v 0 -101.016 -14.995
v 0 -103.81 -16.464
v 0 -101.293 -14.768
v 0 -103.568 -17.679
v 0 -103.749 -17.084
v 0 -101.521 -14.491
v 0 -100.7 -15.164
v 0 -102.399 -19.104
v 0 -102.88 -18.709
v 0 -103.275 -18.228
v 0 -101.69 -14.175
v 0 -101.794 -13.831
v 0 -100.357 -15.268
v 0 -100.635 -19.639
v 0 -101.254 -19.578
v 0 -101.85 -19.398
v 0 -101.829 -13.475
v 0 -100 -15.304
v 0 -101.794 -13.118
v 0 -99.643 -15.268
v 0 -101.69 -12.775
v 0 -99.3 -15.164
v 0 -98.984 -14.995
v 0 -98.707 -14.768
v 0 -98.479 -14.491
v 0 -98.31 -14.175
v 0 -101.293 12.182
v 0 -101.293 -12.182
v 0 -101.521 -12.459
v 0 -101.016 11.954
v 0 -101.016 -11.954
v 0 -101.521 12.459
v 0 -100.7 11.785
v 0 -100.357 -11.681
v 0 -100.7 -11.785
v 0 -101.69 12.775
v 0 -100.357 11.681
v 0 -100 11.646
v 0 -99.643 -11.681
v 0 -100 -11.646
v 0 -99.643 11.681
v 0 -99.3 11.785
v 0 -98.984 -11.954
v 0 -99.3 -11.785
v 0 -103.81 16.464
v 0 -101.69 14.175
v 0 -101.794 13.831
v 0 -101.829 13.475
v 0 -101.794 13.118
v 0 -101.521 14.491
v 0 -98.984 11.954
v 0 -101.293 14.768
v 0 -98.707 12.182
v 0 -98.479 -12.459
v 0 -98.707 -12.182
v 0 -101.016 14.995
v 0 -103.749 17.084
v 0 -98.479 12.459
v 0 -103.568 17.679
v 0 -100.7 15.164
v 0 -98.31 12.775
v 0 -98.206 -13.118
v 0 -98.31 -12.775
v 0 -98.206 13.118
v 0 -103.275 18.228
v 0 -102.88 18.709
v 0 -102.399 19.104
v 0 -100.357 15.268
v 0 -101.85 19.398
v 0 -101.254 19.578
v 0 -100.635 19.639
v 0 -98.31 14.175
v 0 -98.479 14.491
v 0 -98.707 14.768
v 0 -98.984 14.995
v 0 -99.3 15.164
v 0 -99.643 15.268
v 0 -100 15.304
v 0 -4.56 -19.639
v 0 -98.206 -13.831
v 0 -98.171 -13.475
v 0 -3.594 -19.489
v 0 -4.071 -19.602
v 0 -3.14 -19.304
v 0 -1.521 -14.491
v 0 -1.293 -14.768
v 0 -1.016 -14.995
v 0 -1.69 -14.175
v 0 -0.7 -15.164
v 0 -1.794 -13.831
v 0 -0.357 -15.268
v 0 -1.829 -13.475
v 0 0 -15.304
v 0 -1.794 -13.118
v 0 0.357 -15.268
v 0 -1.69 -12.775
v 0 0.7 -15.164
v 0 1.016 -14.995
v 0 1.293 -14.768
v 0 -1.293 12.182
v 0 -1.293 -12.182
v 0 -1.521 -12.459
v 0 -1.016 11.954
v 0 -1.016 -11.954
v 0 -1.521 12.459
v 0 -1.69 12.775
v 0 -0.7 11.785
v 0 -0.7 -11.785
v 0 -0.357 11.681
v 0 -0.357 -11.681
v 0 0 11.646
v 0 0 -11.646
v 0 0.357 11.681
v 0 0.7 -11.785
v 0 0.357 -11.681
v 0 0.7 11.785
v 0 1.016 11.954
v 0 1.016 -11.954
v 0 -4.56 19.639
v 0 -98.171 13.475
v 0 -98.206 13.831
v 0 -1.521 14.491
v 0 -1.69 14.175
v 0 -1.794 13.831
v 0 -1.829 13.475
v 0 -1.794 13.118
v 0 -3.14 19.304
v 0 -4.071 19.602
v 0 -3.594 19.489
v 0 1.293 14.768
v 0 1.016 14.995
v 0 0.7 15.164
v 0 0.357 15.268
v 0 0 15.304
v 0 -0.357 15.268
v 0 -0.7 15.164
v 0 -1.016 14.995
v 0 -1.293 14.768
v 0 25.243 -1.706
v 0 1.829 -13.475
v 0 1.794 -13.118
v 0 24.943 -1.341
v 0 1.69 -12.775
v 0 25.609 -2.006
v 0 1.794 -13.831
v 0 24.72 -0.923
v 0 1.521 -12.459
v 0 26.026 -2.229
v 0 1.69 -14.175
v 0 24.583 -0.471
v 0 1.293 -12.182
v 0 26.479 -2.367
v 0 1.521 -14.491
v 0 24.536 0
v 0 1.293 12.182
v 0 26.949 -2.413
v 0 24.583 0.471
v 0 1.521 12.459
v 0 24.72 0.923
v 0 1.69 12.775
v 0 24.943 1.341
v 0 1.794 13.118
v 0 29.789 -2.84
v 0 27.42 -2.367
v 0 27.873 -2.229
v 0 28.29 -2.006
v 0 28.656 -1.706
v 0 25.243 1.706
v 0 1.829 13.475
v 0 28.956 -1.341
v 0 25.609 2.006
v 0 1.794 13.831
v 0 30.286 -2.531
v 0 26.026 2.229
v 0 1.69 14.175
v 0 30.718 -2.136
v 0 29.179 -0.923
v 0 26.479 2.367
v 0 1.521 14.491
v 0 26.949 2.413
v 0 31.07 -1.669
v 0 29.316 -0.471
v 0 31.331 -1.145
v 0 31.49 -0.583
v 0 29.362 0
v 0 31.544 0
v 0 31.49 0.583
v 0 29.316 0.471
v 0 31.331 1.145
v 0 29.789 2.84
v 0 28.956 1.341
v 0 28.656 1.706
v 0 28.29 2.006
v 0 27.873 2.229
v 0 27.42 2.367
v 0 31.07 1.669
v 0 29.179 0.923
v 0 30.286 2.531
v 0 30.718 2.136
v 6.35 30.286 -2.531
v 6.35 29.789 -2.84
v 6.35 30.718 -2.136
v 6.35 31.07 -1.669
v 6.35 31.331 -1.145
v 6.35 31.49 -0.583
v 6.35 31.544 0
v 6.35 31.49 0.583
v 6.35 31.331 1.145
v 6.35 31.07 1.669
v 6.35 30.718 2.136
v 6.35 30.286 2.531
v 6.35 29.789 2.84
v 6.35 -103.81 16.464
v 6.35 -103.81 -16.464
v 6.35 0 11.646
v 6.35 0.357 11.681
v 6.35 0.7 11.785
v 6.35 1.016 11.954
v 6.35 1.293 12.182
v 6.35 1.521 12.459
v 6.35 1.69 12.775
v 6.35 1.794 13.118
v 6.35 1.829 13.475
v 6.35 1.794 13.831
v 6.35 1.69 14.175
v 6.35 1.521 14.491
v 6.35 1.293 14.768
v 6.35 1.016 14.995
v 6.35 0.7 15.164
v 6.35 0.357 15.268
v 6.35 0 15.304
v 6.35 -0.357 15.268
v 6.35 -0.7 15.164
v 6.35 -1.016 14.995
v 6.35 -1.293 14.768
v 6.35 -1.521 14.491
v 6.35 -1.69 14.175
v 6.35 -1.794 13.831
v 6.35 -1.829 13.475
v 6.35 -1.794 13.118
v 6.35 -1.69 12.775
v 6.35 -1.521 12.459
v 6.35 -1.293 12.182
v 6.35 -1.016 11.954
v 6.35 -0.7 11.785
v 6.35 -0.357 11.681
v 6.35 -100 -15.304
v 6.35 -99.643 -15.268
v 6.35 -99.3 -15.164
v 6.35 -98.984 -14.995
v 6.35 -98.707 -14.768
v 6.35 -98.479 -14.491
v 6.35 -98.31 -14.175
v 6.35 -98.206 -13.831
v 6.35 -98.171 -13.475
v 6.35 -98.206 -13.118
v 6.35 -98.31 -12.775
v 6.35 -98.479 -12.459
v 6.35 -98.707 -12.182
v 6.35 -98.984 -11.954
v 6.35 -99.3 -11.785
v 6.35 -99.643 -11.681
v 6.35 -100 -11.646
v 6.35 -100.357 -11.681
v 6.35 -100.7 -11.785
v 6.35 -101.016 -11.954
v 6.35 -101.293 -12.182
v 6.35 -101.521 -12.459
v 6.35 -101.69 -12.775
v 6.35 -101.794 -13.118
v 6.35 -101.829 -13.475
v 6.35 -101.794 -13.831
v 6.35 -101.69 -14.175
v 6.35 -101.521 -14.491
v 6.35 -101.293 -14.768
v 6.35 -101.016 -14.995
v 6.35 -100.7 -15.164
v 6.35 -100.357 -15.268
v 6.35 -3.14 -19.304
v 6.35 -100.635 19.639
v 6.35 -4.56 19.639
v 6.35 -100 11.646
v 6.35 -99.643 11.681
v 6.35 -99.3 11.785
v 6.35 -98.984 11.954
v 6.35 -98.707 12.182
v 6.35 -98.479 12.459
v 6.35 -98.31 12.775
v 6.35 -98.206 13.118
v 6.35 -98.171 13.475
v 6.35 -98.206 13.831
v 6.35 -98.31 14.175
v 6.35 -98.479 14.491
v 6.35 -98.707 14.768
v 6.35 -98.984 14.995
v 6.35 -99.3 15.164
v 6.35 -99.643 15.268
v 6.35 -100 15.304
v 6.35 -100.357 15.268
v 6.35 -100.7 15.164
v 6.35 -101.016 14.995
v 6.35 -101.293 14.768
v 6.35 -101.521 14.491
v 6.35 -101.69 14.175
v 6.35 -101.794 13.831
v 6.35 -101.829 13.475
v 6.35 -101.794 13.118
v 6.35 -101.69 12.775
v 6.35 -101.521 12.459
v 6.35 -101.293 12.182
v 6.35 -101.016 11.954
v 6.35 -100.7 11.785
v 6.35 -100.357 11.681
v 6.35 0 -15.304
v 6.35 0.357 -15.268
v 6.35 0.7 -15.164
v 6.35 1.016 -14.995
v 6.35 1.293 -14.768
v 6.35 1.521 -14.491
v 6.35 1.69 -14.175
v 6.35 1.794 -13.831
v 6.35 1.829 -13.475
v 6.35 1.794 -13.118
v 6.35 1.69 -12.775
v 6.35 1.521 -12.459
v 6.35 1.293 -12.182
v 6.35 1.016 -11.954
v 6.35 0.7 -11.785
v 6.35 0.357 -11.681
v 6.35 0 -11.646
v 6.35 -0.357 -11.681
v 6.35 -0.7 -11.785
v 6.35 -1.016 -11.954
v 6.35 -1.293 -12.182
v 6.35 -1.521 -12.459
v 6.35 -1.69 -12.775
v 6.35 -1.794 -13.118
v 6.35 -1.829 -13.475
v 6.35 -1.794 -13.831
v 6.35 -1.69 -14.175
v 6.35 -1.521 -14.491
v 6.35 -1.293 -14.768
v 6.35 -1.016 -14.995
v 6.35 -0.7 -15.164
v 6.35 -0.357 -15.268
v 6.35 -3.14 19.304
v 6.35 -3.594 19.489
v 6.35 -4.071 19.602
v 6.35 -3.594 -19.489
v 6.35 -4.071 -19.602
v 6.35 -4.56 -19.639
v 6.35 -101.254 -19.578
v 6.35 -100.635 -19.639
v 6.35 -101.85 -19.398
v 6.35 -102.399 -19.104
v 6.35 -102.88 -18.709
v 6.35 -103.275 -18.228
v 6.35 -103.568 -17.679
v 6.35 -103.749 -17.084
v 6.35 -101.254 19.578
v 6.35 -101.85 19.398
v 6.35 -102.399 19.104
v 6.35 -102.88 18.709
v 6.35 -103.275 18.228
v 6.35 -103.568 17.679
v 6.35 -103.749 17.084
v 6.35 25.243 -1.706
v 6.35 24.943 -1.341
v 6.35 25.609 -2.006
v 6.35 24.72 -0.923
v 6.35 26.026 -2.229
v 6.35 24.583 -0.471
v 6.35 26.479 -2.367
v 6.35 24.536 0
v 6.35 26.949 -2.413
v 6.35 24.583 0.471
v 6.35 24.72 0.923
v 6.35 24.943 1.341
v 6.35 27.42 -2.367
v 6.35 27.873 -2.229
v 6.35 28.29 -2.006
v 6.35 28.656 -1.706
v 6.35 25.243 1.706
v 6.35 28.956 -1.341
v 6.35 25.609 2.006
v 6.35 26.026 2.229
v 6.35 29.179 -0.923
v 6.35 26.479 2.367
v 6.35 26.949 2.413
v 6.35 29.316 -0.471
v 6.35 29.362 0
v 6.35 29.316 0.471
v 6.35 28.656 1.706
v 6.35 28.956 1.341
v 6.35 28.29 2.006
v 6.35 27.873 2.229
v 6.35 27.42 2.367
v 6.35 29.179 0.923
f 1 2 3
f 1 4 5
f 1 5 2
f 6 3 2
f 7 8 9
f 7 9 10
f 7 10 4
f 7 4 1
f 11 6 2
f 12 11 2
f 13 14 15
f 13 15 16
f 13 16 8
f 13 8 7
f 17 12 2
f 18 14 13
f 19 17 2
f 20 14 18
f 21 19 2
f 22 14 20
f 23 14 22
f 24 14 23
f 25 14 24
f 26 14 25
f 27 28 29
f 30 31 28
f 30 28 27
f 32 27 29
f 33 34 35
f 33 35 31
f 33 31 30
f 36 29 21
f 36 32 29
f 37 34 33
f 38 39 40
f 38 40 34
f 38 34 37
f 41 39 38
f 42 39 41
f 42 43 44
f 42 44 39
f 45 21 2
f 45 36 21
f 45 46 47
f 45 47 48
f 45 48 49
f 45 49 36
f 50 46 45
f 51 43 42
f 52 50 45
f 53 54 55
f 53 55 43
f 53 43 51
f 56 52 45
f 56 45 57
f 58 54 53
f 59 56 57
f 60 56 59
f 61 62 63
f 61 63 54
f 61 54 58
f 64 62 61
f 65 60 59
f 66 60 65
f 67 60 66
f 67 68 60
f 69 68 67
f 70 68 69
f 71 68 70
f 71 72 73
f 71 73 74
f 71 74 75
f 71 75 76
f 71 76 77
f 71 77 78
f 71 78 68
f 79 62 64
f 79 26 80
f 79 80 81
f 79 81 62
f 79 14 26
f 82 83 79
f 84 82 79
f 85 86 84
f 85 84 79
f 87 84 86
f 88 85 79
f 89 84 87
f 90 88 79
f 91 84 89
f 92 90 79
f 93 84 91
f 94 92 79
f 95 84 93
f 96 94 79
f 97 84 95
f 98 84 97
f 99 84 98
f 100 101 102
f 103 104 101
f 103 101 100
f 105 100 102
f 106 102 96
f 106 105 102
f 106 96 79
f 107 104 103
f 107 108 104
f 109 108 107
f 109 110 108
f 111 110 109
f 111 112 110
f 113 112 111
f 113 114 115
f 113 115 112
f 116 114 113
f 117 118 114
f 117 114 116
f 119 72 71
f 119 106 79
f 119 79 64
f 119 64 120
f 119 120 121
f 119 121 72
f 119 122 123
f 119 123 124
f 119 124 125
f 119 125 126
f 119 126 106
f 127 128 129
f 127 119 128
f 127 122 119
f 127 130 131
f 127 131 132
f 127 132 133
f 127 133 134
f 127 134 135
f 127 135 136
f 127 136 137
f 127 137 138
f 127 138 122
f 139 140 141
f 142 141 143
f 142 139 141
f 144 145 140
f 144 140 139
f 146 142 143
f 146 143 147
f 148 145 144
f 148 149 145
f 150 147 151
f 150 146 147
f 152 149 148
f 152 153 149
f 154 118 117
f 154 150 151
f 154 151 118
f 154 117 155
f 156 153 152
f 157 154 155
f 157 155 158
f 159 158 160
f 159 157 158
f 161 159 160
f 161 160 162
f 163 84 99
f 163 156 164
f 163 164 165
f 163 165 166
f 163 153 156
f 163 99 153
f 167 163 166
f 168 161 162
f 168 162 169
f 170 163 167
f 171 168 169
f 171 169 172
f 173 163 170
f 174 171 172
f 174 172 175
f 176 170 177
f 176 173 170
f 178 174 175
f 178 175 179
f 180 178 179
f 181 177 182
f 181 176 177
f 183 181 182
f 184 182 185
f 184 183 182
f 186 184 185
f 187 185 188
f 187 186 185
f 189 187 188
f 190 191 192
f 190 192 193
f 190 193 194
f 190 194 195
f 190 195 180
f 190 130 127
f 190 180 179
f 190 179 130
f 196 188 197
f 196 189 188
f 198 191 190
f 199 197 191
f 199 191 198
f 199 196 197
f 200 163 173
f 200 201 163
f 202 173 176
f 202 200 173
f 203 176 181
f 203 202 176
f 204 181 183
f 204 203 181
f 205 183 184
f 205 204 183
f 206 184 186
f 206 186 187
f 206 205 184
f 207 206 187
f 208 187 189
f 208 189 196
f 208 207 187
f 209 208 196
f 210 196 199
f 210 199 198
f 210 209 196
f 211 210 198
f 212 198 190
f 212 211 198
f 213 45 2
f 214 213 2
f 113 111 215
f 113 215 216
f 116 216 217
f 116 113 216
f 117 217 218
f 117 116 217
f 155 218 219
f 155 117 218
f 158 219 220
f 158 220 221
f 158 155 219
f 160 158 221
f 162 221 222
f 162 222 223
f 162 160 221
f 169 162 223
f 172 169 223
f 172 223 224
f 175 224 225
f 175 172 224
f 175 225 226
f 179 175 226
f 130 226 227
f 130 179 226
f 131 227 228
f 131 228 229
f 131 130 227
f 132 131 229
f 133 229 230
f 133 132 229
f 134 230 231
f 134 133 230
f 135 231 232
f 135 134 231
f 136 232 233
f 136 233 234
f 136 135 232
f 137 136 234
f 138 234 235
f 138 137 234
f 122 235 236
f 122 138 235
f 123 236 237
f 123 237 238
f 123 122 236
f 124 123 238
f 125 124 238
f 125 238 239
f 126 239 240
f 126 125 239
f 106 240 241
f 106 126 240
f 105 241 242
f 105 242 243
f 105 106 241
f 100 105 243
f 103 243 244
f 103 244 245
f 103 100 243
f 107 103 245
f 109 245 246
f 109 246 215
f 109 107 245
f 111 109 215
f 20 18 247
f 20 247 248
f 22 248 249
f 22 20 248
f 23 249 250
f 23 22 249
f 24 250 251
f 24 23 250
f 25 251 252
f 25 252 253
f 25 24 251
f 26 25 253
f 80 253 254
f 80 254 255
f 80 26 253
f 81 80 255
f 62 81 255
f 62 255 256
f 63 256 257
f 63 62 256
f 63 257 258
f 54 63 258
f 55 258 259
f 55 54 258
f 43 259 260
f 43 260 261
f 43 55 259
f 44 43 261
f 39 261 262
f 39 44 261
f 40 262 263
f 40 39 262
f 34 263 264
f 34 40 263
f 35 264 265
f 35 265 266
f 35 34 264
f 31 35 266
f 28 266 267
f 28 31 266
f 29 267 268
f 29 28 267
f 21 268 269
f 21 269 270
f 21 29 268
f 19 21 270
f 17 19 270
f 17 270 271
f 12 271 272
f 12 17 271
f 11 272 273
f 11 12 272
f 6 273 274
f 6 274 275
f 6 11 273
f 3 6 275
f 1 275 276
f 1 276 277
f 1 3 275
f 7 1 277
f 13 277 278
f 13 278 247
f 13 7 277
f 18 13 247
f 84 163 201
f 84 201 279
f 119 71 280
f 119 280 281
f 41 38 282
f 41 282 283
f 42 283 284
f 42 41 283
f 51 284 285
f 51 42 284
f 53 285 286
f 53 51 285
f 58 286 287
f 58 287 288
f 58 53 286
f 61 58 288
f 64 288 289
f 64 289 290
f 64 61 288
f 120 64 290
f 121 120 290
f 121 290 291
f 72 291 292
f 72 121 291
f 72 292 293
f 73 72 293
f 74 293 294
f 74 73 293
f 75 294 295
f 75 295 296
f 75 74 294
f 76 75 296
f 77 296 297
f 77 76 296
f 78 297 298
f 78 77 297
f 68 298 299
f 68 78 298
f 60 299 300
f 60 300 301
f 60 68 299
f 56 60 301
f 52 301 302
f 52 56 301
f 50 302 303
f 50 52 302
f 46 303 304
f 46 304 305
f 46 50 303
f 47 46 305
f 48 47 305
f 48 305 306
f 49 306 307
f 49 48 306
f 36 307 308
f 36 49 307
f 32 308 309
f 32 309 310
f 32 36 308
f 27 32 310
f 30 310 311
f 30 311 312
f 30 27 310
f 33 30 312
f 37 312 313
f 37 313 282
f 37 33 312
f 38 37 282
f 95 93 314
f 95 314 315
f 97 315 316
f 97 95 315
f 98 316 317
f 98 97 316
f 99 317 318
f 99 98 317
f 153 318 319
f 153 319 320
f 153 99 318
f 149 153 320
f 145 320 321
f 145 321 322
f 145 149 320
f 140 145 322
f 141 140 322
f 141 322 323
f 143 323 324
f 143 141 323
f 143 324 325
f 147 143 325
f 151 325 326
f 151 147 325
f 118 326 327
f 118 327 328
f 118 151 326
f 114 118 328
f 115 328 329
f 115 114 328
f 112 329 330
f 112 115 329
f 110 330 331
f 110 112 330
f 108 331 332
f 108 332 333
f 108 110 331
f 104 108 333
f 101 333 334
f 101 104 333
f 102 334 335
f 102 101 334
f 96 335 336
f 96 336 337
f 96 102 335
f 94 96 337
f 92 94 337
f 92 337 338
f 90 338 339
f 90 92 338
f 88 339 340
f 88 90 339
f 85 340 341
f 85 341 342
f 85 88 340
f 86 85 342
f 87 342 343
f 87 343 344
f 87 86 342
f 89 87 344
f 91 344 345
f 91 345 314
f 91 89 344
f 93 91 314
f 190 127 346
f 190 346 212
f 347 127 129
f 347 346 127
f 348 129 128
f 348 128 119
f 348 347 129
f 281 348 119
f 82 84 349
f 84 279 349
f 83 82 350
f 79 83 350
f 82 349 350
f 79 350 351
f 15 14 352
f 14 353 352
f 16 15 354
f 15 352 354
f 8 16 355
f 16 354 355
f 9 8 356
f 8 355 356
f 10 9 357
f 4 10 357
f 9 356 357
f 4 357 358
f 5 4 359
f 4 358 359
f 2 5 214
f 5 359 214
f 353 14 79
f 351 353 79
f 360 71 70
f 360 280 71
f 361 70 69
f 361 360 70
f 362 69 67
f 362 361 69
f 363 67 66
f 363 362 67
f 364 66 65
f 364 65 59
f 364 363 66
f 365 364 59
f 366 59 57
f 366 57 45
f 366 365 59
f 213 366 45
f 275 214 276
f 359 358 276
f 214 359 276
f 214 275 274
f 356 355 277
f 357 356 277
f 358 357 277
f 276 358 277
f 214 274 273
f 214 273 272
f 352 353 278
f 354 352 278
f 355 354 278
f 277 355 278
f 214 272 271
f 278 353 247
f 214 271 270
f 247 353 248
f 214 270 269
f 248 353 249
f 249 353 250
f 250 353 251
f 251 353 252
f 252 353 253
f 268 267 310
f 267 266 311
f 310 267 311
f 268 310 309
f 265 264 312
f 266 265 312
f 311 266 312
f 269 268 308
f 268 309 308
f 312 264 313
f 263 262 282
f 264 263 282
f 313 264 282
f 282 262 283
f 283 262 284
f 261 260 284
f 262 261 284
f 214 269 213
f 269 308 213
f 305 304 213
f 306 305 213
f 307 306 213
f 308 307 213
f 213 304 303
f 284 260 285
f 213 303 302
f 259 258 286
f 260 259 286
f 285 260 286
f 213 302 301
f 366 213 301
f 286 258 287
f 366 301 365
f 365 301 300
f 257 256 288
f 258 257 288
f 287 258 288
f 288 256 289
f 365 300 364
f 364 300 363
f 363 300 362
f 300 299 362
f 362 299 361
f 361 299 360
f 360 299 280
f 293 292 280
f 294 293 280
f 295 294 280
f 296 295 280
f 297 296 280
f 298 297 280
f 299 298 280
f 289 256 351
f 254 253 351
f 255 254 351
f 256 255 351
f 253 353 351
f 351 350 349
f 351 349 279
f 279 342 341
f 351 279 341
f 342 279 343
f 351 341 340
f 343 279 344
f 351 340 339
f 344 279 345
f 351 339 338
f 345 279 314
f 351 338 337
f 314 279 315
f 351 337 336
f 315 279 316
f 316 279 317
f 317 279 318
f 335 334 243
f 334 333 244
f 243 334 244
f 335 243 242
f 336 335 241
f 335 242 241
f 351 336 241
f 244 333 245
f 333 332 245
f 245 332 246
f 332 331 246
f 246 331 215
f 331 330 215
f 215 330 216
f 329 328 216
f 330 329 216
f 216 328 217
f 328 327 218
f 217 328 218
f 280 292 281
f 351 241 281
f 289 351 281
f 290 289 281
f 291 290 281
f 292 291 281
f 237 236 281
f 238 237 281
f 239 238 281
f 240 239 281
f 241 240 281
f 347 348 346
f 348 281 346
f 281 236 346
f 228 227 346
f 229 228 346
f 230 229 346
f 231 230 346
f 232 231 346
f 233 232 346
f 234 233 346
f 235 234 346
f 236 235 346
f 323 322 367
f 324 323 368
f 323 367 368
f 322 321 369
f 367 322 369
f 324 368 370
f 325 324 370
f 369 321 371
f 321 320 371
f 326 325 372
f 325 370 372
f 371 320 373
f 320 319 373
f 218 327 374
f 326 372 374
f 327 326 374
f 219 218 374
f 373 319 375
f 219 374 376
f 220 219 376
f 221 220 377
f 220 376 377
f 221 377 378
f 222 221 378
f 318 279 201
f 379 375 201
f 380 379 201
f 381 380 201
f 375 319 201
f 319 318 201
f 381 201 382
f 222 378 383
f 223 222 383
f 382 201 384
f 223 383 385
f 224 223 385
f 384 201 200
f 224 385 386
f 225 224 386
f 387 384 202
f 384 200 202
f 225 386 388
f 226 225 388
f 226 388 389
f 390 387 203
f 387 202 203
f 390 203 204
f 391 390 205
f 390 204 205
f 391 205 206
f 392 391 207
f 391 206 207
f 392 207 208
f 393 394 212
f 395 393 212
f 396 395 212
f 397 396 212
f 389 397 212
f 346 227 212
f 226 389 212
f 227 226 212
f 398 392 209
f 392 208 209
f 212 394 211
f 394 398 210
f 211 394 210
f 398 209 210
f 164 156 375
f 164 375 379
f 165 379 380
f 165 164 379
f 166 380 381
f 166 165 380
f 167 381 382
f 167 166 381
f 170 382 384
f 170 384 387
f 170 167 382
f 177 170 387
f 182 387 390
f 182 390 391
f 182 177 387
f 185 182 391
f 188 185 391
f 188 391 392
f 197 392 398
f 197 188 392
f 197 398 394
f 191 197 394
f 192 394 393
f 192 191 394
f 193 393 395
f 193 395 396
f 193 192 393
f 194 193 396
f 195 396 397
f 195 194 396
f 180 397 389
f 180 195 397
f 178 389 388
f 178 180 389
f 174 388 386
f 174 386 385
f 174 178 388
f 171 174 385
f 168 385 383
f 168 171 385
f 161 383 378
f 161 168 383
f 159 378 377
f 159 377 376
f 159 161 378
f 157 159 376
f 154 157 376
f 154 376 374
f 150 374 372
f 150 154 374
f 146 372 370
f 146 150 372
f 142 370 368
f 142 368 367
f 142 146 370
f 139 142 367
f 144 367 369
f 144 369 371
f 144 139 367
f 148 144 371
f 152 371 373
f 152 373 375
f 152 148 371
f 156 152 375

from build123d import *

# Parameters (mm, degrees)
SKETCH1_W           = 39.278818994
SKETCH1_H           = 100
SKETCH1_R           = 1.8288
SKETCH1_R_2         = 2.413
BOSS_EXTRUDE1_DEPTH = 6.35
FILLET1_R           = 3.175


with BuildPart() as part:
    # Sketch1 → Boss-Extrude1 (new body)
    # profile 1 of 2: a face of its own
    with BuildSketch(Plane(origin=(0, 0, 0), x_dir=(0, 0, -1), z_dir=(1, 0, 0))):
        with Locations((0, -53.81)):
            Rectangle(SKETCH1_W, SKETCH1_H)
        with Locations((13.4747, -100)):
            Circle(SKETCH1_R, mode=Mode.SUBTRACT)
        with Locations((-13.4747, -100)):
            Circle(SKETCH1_R, mode=Mode.SUBTRACT)
    # profile 2 of 2: a face of its own
    with BuildSketch(Plane(origin=(0, 0, 0), x_dir=(0, 0, -1), z_dir=(1, 0, 0))):
        Polygon((0, 35.468818994), (19.639409497, -3.81), (-19.639409497, -3.81), align=None)
        with Locations((13.4747, 0)):
            Circle(SKETCH1_R, mode=Mode.SUBTRACT)
        with Locations((0, 26.9494)):
            Circle(SKETCH1_R_2, mode=Mode.SUBTRACT)
        with Locations((-13.4747, 0)):
            Circle(SKETCH1_R, mode=Mode.SUBTRACT)
    extrude(amount=BOSS_EXTRUDE1_DEPTH)

    # Fillet1
    fillet1_edges = [part.edges().sort_by_distance(p)[0] for p in [
        (3.175, -3.81, 19.639409497),
        (3.175, 35.468818994, 0),
        (3.175, -3.81, -19.639409497),
        (3.175, -103.81, -19.639409497),
        (3.175, -103.81, 19.639409497),
    ]]
    fillet(fillet1_edges, radius=FILLET1_R)


solid = part.part
